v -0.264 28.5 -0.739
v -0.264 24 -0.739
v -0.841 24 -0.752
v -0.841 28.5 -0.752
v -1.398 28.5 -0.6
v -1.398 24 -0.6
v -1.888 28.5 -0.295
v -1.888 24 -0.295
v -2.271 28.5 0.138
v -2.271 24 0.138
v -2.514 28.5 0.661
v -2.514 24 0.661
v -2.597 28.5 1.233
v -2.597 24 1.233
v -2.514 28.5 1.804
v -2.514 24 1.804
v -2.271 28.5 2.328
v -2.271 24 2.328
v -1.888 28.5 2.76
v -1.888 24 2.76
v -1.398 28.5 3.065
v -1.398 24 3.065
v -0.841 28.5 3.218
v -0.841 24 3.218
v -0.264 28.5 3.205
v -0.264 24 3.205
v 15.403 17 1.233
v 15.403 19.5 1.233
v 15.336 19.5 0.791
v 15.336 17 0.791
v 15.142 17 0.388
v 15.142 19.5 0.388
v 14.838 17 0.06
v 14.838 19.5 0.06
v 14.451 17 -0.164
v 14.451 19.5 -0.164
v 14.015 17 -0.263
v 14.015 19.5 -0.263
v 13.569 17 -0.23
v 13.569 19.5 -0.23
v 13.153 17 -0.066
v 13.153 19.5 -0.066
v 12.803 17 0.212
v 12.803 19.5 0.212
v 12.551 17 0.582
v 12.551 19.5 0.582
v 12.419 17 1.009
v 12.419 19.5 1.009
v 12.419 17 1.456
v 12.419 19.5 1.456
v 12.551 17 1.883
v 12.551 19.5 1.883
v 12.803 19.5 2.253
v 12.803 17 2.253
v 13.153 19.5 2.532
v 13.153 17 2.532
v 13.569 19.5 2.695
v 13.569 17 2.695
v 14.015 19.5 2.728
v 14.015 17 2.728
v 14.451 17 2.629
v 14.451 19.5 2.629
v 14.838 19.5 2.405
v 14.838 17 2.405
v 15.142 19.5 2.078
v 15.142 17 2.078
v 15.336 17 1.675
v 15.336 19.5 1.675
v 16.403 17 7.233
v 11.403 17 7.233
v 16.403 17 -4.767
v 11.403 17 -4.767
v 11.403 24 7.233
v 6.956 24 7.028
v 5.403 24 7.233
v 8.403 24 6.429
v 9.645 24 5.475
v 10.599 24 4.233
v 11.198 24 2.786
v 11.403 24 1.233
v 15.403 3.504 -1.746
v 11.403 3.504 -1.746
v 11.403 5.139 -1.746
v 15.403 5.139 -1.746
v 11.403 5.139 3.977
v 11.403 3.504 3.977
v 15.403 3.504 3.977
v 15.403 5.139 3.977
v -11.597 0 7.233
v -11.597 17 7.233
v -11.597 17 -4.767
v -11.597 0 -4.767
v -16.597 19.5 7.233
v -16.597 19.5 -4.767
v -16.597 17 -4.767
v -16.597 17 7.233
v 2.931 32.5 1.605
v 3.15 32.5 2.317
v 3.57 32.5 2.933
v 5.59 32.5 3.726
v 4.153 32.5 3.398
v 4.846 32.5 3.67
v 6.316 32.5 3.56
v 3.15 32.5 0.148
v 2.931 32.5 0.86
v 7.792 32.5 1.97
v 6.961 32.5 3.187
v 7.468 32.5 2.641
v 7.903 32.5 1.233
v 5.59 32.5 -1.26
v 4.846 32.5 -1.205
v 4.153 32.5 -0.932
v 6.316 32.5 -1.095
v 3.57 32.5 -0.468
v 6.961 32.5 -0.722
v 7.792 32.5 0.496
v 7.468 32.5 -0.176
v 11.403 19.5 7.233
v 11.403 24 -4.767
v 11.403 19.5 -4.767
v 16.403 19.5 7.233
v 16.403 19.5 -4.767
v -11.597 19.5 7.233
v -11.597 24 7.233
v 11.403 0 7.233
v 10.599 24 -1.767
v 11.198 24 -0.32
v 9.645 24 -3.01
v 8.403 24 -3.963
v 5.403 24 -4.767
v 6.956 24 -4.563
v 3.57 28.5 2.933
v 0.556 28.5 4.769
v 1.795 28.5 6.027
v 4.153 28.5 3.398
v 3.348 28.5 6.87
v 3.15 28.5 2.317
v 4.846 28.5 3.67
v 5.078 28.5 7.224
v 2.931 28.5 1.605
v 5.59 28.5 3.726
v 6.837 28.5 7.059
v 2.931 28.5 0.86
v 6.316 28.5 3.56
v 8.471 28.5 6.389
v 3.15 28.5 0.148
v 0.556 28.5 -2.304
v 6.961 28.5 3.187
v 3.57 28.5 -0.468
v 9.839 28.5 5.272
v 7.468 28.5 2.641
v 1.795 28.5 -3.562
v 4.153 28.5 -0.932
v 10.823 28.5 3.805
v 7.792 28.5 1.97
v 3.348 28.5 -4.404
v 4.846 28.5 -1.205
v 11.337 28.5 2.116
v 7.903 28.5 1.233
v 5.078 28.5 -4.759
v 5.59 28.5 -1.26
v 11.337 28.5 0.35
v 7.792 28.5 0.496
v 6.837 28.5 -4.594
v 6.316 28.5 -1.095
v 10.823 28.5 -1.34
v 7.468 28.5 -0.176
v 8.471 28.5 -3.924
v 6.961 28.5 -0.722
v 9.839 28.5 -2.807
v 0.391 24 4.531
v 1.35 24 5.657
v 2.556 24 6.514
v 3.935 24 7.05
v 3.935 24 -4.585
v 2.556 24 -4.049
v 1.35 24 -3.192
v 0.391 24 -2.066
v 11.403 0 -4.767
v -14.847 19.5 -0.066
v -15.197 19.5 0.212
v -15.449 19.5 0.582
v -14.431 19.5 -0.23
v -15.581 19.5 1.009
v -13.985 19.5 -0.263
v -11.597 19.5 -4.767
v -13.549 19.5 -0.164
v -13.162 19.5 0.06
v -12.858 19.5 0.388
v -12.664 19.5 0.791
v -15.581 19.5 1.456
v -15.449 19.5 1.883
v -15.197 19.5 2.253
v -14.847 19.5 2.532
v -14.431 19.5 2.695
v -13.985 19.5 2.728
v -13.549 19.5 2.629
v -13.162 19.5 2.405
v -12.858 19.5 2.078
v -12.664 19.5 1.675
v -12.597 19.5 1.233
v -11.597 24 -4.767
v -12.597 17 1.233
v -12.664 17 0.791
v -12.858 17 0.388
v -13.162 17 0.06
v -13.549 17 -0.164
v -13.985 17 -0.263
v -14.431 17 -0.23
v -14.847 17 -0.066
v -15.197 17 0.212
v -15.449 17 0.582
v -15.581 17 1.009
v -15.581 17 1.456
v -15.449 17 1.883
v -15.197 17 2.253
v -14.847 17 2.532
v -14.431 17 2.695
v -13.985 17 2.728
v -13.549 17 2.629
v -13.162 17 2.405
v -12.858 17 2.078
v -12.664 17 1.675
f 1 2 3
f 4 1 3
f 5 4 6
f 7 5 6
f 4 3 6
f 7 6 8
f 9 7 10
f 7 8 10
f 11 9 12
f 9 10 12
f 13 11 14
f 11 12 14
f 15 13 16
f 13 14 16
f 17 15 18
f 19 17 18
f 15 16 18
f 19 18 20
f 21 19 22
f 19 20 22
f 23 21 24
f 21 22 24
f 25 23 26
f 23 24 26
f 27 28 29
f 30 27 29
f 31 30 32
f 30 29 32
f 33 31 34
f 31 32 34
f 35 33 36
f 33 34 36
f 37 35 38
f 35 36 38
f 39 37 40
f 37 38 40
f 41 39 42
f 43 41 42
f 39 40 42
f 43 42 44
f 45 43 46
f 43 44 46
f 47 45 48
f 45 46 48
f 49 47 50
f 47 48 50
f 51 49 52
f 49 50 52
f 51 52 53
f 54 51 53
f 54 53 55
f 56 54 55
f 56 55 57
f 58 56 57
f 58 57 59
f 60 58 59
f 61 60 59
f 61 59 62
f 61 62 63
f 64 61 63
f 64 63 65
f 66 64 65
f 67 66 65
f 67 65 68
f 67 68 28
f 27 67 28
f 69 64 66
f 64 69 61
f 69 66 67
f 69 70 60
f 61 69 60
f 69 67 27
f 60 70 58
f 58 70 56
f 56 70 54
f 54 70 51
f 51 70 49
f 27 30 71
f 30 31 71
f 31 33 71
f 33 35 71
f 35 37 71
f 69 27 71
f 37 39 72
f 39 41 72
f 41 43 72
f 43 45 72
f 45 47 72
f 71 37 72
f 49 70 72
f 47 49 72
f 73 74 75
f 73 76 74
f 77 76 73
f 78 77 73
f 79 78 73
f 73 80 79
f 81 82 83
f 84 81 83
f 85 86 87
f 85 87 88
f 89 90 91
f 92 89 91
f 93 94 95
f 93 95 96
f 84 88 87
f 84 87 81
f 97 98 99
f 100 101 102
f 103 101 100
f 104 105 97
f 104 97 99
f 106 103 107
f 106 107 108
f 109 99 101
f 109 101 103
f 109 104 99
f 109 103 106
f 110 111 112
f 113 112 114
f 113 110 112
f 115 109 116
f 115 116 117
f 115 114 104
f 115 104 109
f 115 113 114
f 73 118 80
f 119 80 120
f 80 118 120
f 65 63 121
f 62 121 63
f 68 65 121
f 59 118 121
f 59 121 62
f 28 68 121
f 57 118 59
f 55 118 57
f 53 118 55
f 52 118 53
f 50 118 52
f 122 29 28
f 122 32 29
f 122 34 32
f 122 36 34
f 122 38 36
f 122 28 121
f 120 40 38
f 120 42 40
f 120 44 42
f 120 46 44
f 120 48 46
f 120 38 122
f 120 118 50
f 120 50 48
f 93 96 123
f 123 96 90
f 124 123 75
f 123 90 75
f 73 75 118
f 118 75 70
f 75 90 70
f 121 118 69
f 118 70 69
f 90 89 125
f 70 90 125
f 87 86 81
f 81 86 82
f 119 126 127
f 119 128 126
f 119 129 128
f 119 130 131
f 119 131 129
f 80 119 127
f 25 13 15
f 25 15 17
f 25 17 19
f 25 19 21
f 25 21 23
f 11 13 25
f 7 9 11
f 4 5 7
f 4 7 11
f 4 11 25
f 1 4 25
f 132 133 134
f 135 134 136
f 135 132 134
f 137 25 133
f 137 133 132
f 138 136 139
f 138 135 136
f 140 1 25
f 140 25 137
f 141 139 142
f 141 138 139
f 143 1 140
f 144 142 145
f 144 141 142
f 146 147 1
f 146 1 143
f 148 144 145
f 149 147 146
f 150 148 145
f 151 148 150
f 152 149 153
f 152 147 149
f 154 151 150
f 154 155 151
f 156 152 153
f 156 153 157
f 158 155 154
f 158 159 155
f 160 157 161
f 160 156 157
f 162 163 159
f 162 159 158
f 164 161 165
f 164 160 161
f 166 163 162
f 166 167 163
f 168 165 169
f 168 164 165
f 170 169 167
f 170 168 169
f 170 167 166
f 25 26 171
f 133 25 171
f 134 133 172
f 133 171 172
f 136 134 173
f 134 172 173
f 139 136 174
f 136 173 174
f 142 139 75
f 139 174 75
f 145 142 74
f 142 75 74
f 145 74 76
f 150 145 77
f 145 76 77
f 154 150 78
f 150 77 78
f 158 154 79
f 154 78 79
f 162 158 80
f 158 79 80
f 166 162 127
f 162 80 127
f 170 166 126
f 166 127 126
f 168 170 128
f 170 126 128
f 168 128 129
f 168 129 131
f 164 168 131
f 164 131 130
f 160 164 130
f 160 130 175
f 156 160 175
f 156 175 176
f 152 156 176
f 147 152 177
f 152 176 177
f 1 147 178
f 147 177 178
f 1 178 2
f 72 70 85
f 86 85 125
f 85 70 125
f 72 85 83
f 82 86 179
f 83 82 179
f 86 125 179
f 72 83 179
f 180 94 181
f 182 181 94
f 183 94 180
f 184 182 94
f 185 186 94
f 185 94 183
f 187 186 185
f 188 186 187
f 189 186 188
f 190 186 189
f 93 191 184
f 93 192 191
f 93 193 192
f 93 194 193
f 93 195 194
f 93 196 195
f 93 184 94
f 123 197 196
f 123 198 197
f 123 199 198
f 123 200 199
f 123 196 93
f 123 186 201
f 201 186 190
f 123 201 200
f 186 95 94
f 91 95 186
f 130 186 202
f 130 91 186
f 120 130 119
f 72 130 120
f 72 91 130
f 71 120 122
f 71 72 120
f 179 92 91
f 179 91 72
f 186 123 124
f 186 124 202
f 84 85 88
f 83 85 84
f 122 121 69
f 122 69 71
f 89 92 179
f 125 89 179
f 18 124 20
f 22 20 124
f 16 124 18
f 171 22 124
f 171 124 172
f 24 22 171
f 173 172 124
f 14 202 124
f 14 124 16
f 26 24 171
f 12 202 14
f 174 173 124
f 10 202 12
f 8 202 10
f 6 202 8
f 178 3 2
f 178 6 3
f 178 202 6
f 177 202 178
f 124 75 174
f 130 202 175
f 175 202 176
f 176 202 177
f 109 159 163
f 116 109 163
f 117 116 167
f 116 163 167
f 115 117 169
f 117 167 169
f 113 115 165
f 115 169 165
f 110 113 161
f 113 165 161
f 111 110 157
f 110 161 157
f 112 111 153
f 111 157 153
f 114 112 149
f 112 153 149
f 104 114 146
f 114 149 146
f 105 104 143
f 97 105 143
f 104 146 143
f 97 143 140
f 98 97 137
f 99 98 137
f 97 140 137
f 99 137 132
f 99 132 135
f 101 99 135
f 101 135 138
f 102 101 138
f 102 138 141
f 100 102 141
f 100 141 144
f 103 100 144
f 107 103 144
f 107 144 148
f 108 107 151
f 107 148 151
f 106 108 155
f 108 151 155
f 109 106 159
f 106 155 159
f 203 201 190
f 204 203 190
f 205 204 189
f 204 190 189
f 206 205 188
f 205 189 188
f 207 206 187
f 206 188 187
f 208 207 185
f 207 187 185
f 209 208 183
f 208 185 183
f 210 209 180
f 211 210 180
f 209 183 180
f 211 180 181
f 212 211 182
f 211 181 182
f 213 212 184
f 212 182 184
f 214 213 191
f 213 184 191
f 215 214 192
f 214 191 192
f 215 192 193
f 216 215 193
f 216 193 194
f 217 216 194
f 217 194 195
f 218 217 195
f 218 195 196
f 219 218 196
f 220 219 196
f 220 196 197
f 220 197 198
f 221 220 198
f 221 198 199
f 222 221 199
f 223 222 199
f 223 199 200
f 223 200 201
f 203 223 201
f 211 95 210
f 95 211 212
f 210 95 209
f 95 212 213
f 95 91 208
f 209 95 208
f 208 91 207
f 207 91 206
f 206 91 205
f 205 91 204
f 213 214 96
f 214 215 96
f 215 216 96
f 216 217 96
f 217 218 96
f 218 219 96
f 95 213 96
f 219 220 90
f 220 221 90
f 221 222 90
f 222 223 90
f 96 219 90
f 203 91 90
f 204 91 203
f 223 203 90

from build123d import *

# Parameters (mm, degrees)
SKETCH2_W           = 23
SKETCH2_H           = 12
BOSS_EXTRUDE1_DEPTH = 24
BOSS_EXTRUDE2_DEPTH = 4.5
SKETCH4_R           = 2.5
BOSS_EXTRUDE3_DEPTH = 4
SKETCH5_W           = 12
SKETCH5_H           = 2.5
BOSS_EXTRUDE4_DEPTH = 5
SKETCH6_W           = 12
SKETCH6_H           = 2.5
BOSS_EXTRUDE5_DEPTH = 5
SKETCH7_R           = 1.5
CUT_EXTRUDE1_DEPTH  = 5
SKETCH8_W           = 5.723155949
SKETCH8_H           = 1.635187414
BOSS_EXTRUDE6_DEPTH = 4


with BuildPart() as part:
    # Sketch2 → Boss-Extrude1 (new body)
    with BuildSketch(Plane(origin=(0, 0, 0), x_dir=(1, 0, 0), z_dir=(0, 1, 0))):
        with Locations((-0.097292724, -1.232656514)):
            Rectangle(SKETCH2_W, SKETCH2_H)
    extrude(amount=BOSS_EXTRUDE1_DEPTH)

    # Sketch3 → Boss-Extrude2 (add)
    with BuildSketch(Plane(origin=(0, 24, 0), x_dir=(1, 0, 0), z_dir=(0, 1, 0))):
        with BuildLine():
            ThreePointArc((-0.263959391, -3.204683109), (11.402707276, -1.232656514), (-0.263959391, 0.73937008))
            ThreePointArc((-0.263959391, 0.73937008), (-2.597292724, -1.232656514), (-0.263959391, -3.204683109))
        make_face()
    extrude(amount=BOSS_EXTRUDE2_DEPTH)

    # Sketch4 → Boss-Extrude3 (add)
    with BuildSketch(Plane(origin=(0, 28.5, 0), x_dir=(1, 0, 0), z_dir=(0, 1, 0))):
        with Locations((5.402707276, -1.232656514)):
            Circle(SKETCH4_R)
    extrude(amount=BOSS_EXTRUDE3_DEPTH)

    # Sketch5 → Boss-Extrude4 (add)
    with BuildSketch(Plane(origin=(11.402707276, 0, 0), x_dir=(0, 0, -1), z_dir=(1, 0, 0))):
        with Locations((-1.232656514, 18.25)):
            Rectangle(SKETCH5_W, SKETCH5_H)
    extrude(amount=BOSS_EXTRUDE4_DEPTH)

    # Sketch6 → Boss-Extrude5 (add)
    with BuildSketch(Plane.ZY.offset(11.597292724)):
        with Locations((1.232656514, 18.25)):
            Rectangle(SKETCH6_W, SKETCH6_H)
    extrude(amount=BOSS_EXTRUDE5_DEPTH)

    # Sketch7 → Cut-Extrude1 (cut)
    with BuildSketch(Plane(origin=(0, 19.5, 0), x_dir=(1, 0, 0), z_dir=(0, 1, 0))):
        with Locations((-14.097292724, -1.232656514)):
            Circle(SKETCH7_R)
        with Locations((13.902707276, -1.232656514)):
            Circle(SKETCH7_R)
    extrude(amount=-CUT_EXTRUDE1_DEPTH, mode=Mode.SUBTRACT)

    # Sketch8 → Boss-Extrude6 (add)
    with BuildSketch(Plane(origin=(11.402707276, 0, 0), x_dir=(0, 0, -1), z_dir=(1, 0, 0))):
        with Locations((-1.115857414, 4.321891812)):
            Rectangle(SKETCH8_W, SKETCH8_H)
    extrude(amount=BOSS_EXTRUDE6_DEPTH)


solid = part.part
